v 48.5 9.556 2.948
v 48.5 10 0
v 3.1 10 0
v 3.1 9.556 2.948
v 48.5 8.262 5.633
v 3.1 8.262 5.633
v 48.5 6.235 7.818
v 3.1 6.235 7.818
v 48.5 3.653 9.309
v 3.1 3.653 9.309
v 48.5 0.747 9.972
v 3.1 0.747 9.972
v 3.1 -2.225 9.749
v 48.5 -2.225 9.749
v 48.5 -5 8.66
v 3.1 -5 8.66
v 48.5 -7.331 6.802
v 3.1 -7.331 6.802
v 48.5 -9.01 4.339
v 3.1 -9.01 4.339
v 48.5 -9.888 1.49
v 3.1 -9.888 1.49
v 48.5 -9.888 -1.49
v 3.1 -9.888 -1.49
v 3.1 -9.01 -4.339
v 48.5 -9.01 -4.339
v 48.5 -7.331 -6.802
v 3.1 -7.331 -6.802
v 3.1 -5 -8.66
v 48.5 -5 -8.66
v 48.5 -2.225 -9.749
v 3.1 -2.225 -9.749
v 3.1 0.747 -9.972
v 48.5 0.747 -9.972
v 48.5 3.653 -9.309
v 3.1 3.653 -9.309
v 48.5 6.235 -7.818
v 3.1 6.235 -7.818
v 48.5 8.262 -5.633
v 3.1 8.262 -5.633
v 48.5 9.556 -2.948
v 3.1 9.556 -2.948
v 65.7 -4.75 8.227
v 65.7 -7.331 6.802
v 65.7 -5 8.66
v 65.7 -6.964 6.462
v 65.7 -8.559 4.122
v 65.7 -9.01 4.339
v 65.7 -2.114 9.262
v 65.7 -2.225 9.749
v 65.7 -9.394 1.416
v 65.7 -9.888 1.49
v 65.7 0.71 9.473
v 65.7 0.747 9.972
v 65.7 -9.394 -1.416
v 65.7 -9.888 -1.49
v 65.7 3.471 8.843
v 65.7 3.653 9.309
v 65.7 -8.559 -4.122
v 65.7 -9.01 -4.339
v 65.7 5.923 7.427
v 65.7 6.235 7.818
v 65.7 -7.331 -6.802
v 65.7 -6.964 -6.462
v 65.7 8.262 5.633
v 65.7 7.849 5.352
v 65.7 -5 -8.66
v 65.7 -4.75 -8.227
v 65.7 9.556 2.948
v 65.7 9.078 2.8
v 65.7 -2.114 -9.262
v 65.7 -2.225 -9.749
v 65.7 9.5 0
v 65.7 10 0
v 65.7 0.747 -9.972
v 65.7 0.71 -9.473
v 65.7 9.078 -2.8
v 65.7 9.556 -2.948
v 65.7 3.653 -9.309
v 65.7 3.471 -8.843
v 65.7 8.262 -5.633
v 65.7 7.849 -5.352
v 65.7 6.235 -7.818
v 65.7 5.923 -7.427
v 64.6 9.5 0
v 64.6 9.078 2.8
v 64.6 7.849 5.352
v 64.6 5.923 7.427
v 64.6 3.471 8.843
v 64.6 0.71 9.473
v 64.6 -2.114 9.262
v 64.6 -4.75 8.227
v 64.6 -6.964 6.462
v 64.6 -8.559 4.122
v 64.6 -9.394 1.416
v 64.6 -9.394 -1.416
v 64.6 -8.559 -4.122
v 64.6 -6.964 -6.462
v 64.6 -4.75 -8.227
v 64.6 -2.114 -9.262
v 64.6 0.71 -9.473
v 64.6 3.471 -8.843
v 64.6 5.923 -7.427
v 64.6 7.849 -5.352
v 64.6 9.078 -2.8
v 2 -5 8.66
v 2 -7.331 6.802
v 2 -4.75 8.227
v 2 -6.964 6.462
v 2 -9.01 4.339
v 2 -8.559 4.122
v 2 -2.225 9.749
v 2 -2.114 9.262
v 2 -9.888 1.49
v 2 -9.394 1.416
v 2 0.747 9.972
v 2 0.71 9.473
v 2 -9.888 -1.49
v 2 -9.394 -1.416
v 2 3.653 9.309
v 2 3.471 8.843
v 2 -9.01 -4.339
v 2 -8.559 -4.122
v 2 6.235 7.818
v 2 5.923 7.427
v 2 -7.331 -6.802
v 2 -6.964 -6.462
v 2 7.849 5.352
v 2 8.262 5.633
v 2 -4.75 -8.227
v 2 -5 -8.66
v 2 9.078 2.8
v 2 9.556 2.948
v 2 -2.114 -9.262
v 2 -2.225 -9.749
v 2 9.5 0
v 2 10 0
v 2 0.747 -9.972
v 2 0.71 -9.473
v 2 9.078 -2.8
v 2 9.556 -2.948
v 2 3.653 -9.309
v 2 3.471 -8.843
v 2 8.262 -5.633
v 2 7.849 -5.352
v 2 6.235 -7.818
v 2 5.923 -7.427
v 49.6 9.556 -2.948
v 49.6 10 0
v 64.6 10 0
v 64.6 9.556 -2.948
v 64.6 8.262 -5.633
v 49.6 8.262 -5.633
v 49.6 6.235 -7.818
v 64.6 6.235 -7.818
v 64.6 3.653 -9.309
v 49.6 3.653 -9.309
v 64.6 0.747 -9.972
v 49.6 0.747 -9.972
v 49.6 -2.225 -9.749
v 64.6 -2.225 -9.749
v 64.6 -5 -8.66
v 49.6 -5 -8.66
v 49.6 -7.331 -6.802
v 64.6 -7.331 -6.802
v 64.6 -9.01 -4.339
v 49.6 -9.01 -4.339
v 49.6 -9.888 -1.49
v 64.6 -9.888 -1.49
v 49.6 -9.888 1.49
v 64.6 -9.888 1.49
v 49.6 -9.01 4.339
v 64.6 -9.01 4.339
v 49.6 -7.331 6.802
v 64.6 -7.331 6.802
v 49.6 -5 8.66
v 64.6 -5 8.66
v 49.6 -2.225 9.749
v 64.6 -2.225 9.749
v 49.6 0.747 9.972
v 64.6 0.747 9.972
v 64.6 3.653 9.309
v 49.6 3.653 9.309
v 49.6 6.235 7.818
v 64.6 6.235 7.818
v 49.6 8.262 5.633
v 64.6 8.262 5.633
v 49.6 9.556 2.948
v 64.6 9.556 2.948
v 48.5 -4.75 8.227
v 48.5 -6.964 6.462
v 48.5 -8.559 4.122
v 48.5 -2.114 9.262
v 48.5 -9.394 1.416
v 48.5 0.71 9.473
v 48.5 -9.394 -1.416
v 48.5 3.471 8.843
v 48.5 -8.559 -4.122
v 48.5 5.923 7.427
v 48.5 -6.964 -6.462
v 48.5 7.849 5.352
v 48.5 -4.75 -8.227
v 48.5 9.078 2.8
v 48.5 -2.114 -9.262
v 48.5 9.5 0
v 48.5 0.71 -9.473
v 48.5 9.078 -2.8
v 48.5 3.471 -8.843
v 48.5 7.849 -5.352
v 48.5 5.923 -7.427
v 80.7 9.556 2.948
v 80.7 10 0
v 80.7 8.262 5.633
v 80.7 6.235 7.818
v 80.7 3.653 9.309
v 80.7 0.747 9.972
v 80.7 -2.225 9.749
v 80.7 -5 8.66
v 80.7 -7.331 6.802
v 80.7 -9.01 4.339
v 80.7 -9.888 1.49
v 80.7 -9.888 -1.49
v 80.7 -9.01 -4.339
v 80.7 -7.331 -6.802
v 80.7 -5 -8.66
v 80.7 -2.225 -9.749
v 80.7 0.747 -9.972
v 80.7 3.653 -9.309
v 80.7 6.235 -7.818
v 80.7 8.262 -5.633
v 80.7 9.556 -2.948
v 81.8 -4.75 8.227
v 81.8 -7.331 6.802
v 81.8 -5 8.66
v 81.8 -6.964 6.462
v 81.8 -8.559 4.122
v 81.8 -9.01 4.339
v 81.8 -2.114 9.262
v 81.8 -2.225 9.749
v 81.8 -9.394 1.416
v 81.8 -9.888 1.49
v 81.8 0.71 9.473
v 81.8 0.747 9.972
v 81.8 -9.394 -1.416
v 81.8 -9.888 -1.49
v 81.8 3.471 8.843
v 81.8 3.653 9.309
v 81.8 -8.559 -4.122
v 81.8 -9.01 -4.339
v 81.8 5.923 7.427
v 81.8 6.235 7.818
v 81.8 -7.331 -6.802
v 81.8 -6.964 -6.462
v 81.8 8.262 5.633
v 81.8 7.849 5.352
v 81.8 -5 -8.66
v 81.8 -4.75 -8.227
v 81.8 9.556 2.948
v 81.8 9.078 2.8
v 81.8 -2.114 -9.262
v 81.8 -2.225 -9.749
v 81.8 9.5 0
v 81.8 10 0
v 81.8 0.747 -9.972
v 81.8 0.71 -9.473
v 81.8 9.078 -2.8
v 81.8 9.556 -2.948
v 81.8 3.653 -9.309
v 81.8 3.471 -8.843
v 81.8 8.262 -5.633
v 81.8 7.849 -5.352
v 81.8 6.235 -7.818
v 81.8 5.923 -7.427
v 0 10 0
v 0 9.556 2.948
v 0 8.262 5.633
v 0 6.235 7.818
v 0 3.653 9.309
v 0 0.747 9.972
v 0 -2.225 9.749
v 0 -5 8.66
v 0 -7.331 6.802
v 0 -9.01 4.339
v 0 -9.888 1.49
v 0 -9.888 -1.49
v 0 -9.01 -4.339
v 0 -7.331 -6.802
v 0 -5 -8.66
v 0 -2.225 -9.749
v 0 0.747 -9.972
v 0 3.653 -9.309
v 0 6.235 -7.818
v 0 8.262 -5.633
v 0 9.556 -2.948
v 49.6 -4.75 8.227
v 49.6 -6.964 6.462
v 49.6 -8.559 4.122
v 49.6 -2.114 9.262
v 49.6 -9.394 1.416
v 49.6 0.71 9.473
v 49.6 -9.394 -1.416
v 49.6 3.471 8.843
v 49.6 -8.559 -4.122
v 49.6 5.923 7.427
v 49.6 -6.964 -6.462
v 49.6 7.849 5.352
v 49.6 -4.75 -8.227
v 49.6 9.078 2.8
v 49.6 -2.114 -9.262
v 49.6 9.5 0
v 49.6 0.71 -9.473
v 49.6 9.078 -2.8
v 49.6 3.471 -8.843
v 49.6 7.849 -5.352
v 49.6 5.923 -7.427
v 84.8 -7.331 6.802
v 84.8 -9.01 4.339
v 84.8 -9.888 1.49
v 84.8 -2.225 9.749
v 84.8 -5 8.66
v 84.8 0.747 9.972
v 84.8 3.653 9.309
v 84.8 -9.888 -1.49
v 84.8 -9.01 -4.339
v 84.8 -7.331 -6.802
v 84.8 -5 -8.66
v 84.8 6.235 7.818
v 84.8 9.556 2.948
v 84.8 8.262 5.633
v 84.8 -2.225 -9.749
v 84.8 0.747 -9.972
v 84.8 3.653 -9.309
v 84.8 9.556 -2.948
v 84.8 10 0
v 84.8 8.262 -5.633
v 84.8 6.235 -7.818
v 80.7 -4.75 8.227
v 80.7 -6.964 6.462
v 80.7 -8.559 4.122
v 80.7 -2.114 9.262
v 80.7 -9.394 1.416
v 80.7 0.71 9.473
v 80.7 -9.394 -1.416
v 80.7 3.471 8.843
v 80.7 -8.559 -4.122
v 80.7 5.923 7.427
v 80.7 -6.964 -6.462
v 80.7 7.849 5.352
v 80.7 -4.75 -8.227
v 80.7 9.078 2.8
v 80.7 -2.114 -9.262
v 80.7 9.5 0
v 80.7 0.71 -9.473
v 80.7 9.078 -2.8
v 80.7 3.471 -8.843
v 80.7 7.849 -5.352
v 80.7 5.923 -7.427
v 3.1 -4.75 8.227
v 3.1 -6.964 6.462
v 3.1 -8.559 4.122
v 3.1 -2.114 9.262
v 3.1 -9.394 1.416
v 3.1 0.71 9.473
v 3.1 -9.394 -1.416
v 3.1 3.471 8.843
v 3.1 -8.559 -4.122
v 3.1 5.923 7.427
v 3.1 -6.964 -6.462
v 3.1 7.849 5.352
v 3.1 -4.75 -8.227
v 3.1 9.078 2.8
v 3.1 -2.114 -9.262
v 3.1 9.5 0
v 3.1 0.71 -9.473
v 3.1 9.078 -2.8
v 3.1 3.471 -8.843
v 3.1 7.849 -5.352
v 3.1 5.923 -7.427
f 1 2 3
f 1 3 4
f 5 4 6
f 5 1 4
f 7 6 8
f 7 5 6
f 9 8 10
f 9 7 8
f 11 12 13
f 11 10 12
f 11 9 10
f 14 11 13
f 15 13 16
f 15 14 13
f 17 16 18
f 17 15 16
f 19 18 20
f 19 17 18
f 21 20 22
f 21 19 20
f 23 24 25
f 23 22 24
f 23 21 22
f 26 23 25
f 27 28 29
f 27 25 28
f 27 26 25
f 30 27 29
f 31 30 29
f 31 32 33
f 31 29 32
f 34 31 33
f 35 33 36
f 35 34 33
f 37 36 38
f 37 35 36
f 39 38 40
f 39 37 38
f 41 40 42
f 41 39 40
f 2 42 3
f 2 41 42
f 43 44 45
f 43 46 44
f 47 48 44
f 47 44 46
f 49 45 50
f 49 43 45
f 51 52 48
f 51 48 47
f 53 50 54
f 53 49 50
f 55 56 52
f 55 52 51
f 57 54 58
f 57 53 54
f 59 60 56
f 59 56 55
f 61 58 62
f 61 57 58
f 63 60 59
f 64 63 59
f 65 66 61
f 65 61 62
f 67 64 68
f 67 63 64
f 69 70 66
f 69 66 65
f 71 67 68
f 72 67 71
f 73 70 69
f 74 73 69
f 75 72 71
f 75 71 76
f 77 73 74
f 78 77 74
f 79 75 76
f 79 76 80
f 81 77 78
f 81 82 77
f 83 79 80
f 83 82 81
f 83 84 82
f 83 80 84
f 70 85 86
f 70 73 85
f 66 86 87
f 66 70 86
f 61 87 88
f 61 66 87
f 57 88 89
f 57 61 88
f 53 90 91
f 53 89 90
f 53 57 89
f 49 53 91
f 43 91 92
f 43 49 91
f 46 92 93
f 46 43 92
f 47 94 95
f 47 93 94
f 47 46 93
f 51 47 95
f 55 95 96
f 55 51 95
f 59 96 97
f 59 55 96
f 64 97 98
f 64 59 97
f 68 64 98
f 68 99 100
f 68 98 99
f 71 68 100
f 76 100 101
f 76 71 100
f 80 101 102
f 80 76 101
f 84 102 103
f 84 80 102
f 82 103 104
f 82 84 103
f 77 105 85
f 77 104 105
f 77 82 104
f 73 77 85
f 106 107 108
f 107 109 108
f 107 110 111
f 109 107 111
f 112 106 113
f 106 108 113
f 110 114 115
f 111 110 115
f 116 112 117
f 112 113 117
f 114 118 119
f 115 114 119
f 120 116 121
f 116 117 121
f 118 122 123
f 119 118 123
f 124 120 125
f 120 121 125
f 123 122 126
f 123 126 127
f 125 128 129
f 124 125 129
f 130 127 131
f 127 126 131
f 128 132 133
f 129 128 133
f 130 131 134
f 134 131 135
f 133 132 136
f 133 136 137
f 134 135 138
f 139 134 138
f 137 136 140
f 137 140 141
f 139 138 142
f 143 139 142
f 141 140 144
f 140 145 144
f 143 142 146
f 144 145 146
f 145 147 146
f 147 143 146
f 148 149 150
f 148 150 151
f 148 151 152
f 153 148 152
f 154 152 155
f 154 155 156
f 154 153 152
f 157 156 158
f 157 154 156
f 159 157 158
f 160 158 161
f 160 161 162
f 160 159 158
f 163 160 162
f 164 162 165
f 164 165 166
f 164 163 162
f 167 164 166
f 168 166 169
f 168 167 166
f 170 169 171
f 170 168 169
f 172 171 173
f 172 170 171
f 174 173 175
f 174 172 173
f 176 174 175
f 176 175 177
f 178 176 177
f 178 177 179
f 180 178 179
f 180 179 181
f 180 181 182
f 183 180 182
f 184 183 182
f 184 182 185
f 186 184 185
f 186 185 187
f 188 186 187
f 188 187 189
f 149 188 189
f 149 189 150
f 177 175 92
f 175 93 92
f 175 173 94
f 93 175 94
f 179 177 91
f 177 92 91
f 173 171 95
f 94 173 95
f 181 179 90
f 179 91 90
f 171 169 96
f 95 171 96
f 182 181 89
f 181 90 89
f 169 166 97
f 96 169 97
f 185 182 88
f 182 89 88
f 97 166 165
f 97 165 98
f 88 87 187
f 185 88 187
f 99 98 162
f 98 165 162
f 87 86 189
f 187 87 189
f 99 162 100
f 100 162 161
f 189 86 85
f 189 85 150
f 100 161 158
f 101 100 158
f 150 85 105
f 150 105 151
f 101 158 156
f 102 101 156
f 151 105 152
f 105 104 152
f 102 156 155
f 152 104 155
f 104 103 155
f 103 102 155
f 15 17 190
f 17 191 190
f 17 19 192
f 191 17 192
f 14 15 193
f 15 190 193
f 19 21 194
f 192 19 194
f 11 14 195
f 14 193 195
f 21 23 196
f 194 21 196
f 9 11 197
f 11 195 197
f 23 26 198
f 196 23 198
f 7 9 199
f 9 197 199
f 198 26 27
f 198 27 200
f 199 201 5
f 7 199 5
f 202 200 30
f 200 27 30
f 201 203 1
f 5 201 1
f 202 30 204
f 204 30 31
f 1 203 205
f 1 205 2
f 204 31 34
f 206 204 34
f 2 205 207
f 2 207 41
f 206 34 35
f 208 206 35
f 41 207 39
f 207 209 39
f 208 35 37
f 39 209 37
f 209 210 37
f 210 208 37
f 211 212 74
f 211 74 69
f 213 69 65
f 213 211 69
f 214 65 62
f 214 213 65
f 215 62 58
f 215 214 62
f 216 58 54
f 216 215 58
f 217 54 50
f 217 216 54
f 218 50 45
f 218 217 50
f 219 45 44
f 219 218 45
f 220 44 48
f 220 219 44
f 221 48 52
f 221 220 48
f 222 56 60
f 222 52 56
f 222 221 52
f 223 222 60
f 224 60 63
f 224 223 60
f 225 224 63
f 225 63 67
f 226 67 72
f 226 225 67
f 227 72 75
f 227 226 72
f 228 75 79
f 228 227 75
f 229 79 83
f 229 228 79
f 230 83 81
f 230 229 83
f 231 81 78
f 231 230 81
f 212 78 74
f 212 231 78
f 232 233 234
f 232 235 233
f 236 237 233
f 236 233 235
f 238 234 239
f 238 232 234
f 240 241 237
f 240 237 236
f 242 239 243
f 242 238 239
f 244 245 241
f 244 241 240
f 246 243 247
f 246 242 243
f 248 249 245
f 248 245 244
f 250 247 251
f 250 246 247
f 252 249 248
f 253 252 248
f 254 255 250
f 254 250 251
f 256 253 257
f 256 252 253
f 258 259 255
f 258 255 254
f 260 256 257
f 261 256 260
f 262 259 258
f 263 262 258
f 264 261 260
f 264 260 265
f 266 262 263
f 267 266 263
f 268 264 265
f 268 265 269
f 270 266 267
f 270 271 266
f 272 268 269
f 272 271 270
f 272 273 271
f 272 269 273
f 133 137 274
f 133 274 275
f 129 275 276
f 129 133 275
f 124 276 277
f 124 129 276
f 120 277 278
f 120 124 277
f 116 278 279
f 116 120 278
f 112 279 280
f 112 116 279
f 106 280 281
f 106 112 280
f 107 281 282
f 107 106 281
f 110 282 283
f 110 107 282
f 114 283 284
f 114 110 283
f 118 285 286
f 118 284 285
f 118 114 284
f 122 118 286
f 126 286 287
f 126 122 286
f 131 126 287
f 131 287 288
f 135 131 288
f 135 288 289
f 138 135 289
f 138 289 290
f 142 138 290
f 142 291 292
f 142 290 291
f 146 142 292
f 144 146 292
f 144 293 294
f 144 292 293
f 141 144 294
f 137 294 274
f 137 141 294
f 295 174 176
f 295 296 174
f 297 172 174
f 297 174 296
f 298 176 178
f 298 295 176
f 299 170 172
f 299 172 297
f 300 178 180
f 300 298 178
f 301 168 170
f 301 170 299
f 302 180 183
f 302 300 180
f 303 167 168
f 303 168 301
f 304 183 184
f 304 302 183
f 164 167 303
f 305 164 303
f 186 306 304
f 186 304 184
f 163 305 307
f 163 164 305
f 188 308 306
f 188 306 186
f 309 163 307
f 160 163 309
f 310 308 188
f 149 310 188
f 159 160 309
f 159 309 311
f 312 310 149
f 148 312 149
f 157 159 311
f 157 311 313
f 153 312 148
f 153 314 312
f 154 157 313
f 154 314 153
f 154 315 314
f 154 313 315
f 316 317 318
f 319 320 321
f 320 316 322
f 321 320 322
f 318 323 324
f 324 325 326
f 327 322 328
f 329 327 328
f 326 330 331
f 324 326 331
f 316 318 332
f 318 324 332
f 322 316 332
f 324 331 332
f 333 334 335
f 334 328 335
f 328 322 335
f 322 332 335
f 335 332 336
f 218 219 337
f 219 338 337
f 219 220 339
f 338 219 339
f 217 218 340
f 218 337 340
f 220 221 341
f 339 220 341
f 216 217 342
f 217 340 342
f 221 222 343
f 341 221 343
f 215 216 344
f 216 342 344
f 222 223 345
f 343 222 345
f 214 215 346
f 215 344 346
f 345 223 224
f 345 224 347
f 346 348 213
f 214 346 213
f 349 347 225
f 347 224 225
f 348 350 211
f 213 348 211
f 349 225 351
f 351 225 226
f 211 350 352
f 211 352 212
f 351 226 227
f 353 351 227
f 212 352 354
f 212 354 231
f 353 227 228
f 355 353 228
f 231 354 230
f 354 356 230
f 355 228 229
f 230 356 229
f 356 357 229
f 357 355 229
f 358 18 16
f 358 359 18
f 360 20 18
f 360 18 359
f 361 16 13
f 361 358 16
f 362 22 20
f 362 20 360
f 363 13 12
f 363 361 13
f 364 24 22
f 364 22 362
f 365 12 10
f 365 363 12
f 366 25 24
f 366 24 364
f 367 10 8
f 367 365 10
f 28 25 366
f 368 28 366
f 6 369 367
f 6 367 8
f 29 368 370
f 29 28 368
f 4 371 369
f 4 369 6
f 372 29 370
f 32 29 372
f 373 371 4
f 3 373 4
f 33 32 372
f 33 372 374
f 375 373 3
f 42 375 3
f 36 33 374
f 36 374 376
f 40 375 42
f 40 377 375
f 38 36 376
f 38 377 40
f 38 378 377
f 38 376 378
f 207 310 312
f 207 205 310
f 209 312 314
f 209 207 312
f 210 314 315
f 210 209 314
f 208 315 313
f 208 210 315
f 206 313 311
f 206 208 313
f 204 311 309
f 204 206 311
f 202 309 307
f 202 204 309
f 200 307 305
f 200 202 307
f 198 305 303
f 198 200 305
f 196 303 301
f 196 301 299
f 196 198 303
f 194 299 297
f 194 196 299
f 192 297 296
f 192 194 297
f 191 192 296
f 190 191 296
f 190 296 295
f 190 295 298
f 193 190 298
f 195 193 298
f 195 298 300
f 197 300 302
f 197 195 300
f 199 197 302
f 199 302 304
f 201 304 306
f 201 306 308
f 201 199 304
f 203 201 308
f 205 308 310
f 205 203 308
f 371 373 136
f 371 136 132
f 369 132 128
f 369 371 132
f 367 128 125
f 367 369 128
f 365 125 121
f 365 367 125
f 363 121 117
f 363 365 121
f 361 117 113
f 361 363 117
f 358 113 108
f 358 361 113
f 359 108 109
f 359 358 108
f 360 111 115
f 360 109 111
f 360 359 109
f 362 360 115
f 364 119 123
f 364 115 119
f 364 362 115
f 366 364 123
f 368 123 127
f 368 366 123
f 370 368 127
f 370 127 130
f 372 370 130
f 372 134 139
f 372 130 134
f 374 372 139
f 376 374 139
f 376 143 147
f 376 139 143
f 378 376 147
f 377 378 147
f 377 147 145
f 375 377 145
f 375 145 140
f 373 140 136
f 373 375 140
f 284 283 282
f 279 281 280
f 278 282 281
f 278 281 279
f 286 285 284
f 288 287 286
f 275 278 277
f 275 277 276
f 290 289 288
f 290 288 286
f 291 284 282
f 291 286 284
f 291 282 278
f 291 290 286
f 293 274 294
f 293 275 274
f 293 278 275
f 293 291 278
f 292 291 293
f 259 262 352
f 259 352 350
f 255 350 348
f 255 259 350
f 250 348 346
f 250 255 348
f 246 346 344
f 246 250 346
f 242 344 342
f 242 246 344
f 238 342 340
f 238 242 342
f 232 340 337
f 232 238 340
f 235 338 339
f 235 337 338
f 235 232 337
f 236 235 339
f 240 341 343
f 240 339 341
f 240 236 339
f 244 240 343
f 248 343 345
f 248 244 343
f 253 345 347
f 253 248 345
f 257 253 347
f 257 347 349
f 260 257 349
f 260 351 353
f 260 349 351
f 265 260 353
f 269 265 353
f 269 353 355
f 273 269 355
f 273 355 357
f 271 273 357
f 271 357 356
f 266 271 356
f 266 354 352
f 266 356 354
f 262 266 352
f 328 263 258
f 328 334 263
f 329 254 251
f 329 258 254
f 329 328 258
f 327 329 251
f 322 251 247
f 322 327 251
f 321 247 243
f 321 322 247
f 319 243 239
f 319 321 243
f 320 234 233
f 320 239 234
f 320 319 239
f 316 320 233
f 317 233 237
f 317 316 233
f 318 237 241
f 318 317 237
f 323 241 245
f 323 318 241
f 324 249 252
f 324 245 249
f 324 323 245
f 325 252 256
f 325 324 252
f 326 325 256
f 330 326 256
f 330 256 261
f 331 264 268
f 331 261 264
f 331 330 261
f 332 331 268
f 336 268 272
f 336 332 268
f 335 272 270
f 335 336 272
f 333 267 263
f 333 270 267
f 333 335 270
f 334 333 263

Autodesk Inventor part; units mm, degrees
ref_plane "YZ Plane" through (0, 0, 0) normal (1, 0, 0) x (0, 1, 0)
ref_plane "XZ Plane" through (0, 0, 0) normal (0, 1, 0) x (-1, 0, 0)
ref_plane "XY Plane" through (0, 0, 0) normal (0, 0, 1) x (1, 0, 0)
sketch "Sketch1" plane through (0, 0, 0) normal (0, 0, 1) x (1, 0, 0)
  line L0 (64.6, 10) -> (64.6, 9.5)
  line L1 (64.6, 9.5) -> (65.7, 9.5)
  line L2 (65.7, 9.5) -> (65.7, 10)
  line L3 (65.7, 10) -> (80.7, 10)
  line L4 (80.7, 10) -> (80.7, 9.5)
  line L5 (80.7, 9.5) -> (81.8, 9.5)
  line L6 (81.8, 9.5) -> (81.8, 10)
  line L7 (81.8, 10) -> (84.8, 10)
  line L8 (84.8, 10) -> (84.8, 0)
  line L9 (84.8, 0) -> (0, 0)
  line L10 (0, 10) -> (0, 0)
  line L11 (64.6, 10) -> (49.6, 10)
  line L12 (49.6, 10) -> (49.6, 9.5)
  line L13 (49.6, 9.5) -> (48.5, 9.5)
  line L14 (48.5, 9.5) -> (48.5, 10)
  line L15 (0, 10) -> (2, 10)
  line L16 (2, 10) -> (2, 9.5)
  line L17 (2, 9.5) -> (3.1, 9.5)
  line L18 (3.1, 9.5) -> (3.1, 10)
  line L19 (3.1, 10) -> (48.5, 10)
  dimension "d3" = 1.1
  dimension "d5" = 1.1
  dimension "d6" = 10
  dimension "d12" = 3
  dimension "d20" = 0.5
  dimension "d21" = 0.5
  dimension "d22" = 0.5
  dimension "d23" = 15
  dimension "d32" = 64.6
  dimension "d33" = 15
  dimension "d34" = 1.1
  dimension "d35" = 0.5
  dimension "d36" = 1.1
  dimension "d37" = 0.5
  dimension "d38" = 2
revolve "Revolution1" add sketch "Sketch1" angle 360 about axis through (84.8, 0, 0) along (-1, 0, 0)
properties part number "Center Axle" material "Steel, Mild"
